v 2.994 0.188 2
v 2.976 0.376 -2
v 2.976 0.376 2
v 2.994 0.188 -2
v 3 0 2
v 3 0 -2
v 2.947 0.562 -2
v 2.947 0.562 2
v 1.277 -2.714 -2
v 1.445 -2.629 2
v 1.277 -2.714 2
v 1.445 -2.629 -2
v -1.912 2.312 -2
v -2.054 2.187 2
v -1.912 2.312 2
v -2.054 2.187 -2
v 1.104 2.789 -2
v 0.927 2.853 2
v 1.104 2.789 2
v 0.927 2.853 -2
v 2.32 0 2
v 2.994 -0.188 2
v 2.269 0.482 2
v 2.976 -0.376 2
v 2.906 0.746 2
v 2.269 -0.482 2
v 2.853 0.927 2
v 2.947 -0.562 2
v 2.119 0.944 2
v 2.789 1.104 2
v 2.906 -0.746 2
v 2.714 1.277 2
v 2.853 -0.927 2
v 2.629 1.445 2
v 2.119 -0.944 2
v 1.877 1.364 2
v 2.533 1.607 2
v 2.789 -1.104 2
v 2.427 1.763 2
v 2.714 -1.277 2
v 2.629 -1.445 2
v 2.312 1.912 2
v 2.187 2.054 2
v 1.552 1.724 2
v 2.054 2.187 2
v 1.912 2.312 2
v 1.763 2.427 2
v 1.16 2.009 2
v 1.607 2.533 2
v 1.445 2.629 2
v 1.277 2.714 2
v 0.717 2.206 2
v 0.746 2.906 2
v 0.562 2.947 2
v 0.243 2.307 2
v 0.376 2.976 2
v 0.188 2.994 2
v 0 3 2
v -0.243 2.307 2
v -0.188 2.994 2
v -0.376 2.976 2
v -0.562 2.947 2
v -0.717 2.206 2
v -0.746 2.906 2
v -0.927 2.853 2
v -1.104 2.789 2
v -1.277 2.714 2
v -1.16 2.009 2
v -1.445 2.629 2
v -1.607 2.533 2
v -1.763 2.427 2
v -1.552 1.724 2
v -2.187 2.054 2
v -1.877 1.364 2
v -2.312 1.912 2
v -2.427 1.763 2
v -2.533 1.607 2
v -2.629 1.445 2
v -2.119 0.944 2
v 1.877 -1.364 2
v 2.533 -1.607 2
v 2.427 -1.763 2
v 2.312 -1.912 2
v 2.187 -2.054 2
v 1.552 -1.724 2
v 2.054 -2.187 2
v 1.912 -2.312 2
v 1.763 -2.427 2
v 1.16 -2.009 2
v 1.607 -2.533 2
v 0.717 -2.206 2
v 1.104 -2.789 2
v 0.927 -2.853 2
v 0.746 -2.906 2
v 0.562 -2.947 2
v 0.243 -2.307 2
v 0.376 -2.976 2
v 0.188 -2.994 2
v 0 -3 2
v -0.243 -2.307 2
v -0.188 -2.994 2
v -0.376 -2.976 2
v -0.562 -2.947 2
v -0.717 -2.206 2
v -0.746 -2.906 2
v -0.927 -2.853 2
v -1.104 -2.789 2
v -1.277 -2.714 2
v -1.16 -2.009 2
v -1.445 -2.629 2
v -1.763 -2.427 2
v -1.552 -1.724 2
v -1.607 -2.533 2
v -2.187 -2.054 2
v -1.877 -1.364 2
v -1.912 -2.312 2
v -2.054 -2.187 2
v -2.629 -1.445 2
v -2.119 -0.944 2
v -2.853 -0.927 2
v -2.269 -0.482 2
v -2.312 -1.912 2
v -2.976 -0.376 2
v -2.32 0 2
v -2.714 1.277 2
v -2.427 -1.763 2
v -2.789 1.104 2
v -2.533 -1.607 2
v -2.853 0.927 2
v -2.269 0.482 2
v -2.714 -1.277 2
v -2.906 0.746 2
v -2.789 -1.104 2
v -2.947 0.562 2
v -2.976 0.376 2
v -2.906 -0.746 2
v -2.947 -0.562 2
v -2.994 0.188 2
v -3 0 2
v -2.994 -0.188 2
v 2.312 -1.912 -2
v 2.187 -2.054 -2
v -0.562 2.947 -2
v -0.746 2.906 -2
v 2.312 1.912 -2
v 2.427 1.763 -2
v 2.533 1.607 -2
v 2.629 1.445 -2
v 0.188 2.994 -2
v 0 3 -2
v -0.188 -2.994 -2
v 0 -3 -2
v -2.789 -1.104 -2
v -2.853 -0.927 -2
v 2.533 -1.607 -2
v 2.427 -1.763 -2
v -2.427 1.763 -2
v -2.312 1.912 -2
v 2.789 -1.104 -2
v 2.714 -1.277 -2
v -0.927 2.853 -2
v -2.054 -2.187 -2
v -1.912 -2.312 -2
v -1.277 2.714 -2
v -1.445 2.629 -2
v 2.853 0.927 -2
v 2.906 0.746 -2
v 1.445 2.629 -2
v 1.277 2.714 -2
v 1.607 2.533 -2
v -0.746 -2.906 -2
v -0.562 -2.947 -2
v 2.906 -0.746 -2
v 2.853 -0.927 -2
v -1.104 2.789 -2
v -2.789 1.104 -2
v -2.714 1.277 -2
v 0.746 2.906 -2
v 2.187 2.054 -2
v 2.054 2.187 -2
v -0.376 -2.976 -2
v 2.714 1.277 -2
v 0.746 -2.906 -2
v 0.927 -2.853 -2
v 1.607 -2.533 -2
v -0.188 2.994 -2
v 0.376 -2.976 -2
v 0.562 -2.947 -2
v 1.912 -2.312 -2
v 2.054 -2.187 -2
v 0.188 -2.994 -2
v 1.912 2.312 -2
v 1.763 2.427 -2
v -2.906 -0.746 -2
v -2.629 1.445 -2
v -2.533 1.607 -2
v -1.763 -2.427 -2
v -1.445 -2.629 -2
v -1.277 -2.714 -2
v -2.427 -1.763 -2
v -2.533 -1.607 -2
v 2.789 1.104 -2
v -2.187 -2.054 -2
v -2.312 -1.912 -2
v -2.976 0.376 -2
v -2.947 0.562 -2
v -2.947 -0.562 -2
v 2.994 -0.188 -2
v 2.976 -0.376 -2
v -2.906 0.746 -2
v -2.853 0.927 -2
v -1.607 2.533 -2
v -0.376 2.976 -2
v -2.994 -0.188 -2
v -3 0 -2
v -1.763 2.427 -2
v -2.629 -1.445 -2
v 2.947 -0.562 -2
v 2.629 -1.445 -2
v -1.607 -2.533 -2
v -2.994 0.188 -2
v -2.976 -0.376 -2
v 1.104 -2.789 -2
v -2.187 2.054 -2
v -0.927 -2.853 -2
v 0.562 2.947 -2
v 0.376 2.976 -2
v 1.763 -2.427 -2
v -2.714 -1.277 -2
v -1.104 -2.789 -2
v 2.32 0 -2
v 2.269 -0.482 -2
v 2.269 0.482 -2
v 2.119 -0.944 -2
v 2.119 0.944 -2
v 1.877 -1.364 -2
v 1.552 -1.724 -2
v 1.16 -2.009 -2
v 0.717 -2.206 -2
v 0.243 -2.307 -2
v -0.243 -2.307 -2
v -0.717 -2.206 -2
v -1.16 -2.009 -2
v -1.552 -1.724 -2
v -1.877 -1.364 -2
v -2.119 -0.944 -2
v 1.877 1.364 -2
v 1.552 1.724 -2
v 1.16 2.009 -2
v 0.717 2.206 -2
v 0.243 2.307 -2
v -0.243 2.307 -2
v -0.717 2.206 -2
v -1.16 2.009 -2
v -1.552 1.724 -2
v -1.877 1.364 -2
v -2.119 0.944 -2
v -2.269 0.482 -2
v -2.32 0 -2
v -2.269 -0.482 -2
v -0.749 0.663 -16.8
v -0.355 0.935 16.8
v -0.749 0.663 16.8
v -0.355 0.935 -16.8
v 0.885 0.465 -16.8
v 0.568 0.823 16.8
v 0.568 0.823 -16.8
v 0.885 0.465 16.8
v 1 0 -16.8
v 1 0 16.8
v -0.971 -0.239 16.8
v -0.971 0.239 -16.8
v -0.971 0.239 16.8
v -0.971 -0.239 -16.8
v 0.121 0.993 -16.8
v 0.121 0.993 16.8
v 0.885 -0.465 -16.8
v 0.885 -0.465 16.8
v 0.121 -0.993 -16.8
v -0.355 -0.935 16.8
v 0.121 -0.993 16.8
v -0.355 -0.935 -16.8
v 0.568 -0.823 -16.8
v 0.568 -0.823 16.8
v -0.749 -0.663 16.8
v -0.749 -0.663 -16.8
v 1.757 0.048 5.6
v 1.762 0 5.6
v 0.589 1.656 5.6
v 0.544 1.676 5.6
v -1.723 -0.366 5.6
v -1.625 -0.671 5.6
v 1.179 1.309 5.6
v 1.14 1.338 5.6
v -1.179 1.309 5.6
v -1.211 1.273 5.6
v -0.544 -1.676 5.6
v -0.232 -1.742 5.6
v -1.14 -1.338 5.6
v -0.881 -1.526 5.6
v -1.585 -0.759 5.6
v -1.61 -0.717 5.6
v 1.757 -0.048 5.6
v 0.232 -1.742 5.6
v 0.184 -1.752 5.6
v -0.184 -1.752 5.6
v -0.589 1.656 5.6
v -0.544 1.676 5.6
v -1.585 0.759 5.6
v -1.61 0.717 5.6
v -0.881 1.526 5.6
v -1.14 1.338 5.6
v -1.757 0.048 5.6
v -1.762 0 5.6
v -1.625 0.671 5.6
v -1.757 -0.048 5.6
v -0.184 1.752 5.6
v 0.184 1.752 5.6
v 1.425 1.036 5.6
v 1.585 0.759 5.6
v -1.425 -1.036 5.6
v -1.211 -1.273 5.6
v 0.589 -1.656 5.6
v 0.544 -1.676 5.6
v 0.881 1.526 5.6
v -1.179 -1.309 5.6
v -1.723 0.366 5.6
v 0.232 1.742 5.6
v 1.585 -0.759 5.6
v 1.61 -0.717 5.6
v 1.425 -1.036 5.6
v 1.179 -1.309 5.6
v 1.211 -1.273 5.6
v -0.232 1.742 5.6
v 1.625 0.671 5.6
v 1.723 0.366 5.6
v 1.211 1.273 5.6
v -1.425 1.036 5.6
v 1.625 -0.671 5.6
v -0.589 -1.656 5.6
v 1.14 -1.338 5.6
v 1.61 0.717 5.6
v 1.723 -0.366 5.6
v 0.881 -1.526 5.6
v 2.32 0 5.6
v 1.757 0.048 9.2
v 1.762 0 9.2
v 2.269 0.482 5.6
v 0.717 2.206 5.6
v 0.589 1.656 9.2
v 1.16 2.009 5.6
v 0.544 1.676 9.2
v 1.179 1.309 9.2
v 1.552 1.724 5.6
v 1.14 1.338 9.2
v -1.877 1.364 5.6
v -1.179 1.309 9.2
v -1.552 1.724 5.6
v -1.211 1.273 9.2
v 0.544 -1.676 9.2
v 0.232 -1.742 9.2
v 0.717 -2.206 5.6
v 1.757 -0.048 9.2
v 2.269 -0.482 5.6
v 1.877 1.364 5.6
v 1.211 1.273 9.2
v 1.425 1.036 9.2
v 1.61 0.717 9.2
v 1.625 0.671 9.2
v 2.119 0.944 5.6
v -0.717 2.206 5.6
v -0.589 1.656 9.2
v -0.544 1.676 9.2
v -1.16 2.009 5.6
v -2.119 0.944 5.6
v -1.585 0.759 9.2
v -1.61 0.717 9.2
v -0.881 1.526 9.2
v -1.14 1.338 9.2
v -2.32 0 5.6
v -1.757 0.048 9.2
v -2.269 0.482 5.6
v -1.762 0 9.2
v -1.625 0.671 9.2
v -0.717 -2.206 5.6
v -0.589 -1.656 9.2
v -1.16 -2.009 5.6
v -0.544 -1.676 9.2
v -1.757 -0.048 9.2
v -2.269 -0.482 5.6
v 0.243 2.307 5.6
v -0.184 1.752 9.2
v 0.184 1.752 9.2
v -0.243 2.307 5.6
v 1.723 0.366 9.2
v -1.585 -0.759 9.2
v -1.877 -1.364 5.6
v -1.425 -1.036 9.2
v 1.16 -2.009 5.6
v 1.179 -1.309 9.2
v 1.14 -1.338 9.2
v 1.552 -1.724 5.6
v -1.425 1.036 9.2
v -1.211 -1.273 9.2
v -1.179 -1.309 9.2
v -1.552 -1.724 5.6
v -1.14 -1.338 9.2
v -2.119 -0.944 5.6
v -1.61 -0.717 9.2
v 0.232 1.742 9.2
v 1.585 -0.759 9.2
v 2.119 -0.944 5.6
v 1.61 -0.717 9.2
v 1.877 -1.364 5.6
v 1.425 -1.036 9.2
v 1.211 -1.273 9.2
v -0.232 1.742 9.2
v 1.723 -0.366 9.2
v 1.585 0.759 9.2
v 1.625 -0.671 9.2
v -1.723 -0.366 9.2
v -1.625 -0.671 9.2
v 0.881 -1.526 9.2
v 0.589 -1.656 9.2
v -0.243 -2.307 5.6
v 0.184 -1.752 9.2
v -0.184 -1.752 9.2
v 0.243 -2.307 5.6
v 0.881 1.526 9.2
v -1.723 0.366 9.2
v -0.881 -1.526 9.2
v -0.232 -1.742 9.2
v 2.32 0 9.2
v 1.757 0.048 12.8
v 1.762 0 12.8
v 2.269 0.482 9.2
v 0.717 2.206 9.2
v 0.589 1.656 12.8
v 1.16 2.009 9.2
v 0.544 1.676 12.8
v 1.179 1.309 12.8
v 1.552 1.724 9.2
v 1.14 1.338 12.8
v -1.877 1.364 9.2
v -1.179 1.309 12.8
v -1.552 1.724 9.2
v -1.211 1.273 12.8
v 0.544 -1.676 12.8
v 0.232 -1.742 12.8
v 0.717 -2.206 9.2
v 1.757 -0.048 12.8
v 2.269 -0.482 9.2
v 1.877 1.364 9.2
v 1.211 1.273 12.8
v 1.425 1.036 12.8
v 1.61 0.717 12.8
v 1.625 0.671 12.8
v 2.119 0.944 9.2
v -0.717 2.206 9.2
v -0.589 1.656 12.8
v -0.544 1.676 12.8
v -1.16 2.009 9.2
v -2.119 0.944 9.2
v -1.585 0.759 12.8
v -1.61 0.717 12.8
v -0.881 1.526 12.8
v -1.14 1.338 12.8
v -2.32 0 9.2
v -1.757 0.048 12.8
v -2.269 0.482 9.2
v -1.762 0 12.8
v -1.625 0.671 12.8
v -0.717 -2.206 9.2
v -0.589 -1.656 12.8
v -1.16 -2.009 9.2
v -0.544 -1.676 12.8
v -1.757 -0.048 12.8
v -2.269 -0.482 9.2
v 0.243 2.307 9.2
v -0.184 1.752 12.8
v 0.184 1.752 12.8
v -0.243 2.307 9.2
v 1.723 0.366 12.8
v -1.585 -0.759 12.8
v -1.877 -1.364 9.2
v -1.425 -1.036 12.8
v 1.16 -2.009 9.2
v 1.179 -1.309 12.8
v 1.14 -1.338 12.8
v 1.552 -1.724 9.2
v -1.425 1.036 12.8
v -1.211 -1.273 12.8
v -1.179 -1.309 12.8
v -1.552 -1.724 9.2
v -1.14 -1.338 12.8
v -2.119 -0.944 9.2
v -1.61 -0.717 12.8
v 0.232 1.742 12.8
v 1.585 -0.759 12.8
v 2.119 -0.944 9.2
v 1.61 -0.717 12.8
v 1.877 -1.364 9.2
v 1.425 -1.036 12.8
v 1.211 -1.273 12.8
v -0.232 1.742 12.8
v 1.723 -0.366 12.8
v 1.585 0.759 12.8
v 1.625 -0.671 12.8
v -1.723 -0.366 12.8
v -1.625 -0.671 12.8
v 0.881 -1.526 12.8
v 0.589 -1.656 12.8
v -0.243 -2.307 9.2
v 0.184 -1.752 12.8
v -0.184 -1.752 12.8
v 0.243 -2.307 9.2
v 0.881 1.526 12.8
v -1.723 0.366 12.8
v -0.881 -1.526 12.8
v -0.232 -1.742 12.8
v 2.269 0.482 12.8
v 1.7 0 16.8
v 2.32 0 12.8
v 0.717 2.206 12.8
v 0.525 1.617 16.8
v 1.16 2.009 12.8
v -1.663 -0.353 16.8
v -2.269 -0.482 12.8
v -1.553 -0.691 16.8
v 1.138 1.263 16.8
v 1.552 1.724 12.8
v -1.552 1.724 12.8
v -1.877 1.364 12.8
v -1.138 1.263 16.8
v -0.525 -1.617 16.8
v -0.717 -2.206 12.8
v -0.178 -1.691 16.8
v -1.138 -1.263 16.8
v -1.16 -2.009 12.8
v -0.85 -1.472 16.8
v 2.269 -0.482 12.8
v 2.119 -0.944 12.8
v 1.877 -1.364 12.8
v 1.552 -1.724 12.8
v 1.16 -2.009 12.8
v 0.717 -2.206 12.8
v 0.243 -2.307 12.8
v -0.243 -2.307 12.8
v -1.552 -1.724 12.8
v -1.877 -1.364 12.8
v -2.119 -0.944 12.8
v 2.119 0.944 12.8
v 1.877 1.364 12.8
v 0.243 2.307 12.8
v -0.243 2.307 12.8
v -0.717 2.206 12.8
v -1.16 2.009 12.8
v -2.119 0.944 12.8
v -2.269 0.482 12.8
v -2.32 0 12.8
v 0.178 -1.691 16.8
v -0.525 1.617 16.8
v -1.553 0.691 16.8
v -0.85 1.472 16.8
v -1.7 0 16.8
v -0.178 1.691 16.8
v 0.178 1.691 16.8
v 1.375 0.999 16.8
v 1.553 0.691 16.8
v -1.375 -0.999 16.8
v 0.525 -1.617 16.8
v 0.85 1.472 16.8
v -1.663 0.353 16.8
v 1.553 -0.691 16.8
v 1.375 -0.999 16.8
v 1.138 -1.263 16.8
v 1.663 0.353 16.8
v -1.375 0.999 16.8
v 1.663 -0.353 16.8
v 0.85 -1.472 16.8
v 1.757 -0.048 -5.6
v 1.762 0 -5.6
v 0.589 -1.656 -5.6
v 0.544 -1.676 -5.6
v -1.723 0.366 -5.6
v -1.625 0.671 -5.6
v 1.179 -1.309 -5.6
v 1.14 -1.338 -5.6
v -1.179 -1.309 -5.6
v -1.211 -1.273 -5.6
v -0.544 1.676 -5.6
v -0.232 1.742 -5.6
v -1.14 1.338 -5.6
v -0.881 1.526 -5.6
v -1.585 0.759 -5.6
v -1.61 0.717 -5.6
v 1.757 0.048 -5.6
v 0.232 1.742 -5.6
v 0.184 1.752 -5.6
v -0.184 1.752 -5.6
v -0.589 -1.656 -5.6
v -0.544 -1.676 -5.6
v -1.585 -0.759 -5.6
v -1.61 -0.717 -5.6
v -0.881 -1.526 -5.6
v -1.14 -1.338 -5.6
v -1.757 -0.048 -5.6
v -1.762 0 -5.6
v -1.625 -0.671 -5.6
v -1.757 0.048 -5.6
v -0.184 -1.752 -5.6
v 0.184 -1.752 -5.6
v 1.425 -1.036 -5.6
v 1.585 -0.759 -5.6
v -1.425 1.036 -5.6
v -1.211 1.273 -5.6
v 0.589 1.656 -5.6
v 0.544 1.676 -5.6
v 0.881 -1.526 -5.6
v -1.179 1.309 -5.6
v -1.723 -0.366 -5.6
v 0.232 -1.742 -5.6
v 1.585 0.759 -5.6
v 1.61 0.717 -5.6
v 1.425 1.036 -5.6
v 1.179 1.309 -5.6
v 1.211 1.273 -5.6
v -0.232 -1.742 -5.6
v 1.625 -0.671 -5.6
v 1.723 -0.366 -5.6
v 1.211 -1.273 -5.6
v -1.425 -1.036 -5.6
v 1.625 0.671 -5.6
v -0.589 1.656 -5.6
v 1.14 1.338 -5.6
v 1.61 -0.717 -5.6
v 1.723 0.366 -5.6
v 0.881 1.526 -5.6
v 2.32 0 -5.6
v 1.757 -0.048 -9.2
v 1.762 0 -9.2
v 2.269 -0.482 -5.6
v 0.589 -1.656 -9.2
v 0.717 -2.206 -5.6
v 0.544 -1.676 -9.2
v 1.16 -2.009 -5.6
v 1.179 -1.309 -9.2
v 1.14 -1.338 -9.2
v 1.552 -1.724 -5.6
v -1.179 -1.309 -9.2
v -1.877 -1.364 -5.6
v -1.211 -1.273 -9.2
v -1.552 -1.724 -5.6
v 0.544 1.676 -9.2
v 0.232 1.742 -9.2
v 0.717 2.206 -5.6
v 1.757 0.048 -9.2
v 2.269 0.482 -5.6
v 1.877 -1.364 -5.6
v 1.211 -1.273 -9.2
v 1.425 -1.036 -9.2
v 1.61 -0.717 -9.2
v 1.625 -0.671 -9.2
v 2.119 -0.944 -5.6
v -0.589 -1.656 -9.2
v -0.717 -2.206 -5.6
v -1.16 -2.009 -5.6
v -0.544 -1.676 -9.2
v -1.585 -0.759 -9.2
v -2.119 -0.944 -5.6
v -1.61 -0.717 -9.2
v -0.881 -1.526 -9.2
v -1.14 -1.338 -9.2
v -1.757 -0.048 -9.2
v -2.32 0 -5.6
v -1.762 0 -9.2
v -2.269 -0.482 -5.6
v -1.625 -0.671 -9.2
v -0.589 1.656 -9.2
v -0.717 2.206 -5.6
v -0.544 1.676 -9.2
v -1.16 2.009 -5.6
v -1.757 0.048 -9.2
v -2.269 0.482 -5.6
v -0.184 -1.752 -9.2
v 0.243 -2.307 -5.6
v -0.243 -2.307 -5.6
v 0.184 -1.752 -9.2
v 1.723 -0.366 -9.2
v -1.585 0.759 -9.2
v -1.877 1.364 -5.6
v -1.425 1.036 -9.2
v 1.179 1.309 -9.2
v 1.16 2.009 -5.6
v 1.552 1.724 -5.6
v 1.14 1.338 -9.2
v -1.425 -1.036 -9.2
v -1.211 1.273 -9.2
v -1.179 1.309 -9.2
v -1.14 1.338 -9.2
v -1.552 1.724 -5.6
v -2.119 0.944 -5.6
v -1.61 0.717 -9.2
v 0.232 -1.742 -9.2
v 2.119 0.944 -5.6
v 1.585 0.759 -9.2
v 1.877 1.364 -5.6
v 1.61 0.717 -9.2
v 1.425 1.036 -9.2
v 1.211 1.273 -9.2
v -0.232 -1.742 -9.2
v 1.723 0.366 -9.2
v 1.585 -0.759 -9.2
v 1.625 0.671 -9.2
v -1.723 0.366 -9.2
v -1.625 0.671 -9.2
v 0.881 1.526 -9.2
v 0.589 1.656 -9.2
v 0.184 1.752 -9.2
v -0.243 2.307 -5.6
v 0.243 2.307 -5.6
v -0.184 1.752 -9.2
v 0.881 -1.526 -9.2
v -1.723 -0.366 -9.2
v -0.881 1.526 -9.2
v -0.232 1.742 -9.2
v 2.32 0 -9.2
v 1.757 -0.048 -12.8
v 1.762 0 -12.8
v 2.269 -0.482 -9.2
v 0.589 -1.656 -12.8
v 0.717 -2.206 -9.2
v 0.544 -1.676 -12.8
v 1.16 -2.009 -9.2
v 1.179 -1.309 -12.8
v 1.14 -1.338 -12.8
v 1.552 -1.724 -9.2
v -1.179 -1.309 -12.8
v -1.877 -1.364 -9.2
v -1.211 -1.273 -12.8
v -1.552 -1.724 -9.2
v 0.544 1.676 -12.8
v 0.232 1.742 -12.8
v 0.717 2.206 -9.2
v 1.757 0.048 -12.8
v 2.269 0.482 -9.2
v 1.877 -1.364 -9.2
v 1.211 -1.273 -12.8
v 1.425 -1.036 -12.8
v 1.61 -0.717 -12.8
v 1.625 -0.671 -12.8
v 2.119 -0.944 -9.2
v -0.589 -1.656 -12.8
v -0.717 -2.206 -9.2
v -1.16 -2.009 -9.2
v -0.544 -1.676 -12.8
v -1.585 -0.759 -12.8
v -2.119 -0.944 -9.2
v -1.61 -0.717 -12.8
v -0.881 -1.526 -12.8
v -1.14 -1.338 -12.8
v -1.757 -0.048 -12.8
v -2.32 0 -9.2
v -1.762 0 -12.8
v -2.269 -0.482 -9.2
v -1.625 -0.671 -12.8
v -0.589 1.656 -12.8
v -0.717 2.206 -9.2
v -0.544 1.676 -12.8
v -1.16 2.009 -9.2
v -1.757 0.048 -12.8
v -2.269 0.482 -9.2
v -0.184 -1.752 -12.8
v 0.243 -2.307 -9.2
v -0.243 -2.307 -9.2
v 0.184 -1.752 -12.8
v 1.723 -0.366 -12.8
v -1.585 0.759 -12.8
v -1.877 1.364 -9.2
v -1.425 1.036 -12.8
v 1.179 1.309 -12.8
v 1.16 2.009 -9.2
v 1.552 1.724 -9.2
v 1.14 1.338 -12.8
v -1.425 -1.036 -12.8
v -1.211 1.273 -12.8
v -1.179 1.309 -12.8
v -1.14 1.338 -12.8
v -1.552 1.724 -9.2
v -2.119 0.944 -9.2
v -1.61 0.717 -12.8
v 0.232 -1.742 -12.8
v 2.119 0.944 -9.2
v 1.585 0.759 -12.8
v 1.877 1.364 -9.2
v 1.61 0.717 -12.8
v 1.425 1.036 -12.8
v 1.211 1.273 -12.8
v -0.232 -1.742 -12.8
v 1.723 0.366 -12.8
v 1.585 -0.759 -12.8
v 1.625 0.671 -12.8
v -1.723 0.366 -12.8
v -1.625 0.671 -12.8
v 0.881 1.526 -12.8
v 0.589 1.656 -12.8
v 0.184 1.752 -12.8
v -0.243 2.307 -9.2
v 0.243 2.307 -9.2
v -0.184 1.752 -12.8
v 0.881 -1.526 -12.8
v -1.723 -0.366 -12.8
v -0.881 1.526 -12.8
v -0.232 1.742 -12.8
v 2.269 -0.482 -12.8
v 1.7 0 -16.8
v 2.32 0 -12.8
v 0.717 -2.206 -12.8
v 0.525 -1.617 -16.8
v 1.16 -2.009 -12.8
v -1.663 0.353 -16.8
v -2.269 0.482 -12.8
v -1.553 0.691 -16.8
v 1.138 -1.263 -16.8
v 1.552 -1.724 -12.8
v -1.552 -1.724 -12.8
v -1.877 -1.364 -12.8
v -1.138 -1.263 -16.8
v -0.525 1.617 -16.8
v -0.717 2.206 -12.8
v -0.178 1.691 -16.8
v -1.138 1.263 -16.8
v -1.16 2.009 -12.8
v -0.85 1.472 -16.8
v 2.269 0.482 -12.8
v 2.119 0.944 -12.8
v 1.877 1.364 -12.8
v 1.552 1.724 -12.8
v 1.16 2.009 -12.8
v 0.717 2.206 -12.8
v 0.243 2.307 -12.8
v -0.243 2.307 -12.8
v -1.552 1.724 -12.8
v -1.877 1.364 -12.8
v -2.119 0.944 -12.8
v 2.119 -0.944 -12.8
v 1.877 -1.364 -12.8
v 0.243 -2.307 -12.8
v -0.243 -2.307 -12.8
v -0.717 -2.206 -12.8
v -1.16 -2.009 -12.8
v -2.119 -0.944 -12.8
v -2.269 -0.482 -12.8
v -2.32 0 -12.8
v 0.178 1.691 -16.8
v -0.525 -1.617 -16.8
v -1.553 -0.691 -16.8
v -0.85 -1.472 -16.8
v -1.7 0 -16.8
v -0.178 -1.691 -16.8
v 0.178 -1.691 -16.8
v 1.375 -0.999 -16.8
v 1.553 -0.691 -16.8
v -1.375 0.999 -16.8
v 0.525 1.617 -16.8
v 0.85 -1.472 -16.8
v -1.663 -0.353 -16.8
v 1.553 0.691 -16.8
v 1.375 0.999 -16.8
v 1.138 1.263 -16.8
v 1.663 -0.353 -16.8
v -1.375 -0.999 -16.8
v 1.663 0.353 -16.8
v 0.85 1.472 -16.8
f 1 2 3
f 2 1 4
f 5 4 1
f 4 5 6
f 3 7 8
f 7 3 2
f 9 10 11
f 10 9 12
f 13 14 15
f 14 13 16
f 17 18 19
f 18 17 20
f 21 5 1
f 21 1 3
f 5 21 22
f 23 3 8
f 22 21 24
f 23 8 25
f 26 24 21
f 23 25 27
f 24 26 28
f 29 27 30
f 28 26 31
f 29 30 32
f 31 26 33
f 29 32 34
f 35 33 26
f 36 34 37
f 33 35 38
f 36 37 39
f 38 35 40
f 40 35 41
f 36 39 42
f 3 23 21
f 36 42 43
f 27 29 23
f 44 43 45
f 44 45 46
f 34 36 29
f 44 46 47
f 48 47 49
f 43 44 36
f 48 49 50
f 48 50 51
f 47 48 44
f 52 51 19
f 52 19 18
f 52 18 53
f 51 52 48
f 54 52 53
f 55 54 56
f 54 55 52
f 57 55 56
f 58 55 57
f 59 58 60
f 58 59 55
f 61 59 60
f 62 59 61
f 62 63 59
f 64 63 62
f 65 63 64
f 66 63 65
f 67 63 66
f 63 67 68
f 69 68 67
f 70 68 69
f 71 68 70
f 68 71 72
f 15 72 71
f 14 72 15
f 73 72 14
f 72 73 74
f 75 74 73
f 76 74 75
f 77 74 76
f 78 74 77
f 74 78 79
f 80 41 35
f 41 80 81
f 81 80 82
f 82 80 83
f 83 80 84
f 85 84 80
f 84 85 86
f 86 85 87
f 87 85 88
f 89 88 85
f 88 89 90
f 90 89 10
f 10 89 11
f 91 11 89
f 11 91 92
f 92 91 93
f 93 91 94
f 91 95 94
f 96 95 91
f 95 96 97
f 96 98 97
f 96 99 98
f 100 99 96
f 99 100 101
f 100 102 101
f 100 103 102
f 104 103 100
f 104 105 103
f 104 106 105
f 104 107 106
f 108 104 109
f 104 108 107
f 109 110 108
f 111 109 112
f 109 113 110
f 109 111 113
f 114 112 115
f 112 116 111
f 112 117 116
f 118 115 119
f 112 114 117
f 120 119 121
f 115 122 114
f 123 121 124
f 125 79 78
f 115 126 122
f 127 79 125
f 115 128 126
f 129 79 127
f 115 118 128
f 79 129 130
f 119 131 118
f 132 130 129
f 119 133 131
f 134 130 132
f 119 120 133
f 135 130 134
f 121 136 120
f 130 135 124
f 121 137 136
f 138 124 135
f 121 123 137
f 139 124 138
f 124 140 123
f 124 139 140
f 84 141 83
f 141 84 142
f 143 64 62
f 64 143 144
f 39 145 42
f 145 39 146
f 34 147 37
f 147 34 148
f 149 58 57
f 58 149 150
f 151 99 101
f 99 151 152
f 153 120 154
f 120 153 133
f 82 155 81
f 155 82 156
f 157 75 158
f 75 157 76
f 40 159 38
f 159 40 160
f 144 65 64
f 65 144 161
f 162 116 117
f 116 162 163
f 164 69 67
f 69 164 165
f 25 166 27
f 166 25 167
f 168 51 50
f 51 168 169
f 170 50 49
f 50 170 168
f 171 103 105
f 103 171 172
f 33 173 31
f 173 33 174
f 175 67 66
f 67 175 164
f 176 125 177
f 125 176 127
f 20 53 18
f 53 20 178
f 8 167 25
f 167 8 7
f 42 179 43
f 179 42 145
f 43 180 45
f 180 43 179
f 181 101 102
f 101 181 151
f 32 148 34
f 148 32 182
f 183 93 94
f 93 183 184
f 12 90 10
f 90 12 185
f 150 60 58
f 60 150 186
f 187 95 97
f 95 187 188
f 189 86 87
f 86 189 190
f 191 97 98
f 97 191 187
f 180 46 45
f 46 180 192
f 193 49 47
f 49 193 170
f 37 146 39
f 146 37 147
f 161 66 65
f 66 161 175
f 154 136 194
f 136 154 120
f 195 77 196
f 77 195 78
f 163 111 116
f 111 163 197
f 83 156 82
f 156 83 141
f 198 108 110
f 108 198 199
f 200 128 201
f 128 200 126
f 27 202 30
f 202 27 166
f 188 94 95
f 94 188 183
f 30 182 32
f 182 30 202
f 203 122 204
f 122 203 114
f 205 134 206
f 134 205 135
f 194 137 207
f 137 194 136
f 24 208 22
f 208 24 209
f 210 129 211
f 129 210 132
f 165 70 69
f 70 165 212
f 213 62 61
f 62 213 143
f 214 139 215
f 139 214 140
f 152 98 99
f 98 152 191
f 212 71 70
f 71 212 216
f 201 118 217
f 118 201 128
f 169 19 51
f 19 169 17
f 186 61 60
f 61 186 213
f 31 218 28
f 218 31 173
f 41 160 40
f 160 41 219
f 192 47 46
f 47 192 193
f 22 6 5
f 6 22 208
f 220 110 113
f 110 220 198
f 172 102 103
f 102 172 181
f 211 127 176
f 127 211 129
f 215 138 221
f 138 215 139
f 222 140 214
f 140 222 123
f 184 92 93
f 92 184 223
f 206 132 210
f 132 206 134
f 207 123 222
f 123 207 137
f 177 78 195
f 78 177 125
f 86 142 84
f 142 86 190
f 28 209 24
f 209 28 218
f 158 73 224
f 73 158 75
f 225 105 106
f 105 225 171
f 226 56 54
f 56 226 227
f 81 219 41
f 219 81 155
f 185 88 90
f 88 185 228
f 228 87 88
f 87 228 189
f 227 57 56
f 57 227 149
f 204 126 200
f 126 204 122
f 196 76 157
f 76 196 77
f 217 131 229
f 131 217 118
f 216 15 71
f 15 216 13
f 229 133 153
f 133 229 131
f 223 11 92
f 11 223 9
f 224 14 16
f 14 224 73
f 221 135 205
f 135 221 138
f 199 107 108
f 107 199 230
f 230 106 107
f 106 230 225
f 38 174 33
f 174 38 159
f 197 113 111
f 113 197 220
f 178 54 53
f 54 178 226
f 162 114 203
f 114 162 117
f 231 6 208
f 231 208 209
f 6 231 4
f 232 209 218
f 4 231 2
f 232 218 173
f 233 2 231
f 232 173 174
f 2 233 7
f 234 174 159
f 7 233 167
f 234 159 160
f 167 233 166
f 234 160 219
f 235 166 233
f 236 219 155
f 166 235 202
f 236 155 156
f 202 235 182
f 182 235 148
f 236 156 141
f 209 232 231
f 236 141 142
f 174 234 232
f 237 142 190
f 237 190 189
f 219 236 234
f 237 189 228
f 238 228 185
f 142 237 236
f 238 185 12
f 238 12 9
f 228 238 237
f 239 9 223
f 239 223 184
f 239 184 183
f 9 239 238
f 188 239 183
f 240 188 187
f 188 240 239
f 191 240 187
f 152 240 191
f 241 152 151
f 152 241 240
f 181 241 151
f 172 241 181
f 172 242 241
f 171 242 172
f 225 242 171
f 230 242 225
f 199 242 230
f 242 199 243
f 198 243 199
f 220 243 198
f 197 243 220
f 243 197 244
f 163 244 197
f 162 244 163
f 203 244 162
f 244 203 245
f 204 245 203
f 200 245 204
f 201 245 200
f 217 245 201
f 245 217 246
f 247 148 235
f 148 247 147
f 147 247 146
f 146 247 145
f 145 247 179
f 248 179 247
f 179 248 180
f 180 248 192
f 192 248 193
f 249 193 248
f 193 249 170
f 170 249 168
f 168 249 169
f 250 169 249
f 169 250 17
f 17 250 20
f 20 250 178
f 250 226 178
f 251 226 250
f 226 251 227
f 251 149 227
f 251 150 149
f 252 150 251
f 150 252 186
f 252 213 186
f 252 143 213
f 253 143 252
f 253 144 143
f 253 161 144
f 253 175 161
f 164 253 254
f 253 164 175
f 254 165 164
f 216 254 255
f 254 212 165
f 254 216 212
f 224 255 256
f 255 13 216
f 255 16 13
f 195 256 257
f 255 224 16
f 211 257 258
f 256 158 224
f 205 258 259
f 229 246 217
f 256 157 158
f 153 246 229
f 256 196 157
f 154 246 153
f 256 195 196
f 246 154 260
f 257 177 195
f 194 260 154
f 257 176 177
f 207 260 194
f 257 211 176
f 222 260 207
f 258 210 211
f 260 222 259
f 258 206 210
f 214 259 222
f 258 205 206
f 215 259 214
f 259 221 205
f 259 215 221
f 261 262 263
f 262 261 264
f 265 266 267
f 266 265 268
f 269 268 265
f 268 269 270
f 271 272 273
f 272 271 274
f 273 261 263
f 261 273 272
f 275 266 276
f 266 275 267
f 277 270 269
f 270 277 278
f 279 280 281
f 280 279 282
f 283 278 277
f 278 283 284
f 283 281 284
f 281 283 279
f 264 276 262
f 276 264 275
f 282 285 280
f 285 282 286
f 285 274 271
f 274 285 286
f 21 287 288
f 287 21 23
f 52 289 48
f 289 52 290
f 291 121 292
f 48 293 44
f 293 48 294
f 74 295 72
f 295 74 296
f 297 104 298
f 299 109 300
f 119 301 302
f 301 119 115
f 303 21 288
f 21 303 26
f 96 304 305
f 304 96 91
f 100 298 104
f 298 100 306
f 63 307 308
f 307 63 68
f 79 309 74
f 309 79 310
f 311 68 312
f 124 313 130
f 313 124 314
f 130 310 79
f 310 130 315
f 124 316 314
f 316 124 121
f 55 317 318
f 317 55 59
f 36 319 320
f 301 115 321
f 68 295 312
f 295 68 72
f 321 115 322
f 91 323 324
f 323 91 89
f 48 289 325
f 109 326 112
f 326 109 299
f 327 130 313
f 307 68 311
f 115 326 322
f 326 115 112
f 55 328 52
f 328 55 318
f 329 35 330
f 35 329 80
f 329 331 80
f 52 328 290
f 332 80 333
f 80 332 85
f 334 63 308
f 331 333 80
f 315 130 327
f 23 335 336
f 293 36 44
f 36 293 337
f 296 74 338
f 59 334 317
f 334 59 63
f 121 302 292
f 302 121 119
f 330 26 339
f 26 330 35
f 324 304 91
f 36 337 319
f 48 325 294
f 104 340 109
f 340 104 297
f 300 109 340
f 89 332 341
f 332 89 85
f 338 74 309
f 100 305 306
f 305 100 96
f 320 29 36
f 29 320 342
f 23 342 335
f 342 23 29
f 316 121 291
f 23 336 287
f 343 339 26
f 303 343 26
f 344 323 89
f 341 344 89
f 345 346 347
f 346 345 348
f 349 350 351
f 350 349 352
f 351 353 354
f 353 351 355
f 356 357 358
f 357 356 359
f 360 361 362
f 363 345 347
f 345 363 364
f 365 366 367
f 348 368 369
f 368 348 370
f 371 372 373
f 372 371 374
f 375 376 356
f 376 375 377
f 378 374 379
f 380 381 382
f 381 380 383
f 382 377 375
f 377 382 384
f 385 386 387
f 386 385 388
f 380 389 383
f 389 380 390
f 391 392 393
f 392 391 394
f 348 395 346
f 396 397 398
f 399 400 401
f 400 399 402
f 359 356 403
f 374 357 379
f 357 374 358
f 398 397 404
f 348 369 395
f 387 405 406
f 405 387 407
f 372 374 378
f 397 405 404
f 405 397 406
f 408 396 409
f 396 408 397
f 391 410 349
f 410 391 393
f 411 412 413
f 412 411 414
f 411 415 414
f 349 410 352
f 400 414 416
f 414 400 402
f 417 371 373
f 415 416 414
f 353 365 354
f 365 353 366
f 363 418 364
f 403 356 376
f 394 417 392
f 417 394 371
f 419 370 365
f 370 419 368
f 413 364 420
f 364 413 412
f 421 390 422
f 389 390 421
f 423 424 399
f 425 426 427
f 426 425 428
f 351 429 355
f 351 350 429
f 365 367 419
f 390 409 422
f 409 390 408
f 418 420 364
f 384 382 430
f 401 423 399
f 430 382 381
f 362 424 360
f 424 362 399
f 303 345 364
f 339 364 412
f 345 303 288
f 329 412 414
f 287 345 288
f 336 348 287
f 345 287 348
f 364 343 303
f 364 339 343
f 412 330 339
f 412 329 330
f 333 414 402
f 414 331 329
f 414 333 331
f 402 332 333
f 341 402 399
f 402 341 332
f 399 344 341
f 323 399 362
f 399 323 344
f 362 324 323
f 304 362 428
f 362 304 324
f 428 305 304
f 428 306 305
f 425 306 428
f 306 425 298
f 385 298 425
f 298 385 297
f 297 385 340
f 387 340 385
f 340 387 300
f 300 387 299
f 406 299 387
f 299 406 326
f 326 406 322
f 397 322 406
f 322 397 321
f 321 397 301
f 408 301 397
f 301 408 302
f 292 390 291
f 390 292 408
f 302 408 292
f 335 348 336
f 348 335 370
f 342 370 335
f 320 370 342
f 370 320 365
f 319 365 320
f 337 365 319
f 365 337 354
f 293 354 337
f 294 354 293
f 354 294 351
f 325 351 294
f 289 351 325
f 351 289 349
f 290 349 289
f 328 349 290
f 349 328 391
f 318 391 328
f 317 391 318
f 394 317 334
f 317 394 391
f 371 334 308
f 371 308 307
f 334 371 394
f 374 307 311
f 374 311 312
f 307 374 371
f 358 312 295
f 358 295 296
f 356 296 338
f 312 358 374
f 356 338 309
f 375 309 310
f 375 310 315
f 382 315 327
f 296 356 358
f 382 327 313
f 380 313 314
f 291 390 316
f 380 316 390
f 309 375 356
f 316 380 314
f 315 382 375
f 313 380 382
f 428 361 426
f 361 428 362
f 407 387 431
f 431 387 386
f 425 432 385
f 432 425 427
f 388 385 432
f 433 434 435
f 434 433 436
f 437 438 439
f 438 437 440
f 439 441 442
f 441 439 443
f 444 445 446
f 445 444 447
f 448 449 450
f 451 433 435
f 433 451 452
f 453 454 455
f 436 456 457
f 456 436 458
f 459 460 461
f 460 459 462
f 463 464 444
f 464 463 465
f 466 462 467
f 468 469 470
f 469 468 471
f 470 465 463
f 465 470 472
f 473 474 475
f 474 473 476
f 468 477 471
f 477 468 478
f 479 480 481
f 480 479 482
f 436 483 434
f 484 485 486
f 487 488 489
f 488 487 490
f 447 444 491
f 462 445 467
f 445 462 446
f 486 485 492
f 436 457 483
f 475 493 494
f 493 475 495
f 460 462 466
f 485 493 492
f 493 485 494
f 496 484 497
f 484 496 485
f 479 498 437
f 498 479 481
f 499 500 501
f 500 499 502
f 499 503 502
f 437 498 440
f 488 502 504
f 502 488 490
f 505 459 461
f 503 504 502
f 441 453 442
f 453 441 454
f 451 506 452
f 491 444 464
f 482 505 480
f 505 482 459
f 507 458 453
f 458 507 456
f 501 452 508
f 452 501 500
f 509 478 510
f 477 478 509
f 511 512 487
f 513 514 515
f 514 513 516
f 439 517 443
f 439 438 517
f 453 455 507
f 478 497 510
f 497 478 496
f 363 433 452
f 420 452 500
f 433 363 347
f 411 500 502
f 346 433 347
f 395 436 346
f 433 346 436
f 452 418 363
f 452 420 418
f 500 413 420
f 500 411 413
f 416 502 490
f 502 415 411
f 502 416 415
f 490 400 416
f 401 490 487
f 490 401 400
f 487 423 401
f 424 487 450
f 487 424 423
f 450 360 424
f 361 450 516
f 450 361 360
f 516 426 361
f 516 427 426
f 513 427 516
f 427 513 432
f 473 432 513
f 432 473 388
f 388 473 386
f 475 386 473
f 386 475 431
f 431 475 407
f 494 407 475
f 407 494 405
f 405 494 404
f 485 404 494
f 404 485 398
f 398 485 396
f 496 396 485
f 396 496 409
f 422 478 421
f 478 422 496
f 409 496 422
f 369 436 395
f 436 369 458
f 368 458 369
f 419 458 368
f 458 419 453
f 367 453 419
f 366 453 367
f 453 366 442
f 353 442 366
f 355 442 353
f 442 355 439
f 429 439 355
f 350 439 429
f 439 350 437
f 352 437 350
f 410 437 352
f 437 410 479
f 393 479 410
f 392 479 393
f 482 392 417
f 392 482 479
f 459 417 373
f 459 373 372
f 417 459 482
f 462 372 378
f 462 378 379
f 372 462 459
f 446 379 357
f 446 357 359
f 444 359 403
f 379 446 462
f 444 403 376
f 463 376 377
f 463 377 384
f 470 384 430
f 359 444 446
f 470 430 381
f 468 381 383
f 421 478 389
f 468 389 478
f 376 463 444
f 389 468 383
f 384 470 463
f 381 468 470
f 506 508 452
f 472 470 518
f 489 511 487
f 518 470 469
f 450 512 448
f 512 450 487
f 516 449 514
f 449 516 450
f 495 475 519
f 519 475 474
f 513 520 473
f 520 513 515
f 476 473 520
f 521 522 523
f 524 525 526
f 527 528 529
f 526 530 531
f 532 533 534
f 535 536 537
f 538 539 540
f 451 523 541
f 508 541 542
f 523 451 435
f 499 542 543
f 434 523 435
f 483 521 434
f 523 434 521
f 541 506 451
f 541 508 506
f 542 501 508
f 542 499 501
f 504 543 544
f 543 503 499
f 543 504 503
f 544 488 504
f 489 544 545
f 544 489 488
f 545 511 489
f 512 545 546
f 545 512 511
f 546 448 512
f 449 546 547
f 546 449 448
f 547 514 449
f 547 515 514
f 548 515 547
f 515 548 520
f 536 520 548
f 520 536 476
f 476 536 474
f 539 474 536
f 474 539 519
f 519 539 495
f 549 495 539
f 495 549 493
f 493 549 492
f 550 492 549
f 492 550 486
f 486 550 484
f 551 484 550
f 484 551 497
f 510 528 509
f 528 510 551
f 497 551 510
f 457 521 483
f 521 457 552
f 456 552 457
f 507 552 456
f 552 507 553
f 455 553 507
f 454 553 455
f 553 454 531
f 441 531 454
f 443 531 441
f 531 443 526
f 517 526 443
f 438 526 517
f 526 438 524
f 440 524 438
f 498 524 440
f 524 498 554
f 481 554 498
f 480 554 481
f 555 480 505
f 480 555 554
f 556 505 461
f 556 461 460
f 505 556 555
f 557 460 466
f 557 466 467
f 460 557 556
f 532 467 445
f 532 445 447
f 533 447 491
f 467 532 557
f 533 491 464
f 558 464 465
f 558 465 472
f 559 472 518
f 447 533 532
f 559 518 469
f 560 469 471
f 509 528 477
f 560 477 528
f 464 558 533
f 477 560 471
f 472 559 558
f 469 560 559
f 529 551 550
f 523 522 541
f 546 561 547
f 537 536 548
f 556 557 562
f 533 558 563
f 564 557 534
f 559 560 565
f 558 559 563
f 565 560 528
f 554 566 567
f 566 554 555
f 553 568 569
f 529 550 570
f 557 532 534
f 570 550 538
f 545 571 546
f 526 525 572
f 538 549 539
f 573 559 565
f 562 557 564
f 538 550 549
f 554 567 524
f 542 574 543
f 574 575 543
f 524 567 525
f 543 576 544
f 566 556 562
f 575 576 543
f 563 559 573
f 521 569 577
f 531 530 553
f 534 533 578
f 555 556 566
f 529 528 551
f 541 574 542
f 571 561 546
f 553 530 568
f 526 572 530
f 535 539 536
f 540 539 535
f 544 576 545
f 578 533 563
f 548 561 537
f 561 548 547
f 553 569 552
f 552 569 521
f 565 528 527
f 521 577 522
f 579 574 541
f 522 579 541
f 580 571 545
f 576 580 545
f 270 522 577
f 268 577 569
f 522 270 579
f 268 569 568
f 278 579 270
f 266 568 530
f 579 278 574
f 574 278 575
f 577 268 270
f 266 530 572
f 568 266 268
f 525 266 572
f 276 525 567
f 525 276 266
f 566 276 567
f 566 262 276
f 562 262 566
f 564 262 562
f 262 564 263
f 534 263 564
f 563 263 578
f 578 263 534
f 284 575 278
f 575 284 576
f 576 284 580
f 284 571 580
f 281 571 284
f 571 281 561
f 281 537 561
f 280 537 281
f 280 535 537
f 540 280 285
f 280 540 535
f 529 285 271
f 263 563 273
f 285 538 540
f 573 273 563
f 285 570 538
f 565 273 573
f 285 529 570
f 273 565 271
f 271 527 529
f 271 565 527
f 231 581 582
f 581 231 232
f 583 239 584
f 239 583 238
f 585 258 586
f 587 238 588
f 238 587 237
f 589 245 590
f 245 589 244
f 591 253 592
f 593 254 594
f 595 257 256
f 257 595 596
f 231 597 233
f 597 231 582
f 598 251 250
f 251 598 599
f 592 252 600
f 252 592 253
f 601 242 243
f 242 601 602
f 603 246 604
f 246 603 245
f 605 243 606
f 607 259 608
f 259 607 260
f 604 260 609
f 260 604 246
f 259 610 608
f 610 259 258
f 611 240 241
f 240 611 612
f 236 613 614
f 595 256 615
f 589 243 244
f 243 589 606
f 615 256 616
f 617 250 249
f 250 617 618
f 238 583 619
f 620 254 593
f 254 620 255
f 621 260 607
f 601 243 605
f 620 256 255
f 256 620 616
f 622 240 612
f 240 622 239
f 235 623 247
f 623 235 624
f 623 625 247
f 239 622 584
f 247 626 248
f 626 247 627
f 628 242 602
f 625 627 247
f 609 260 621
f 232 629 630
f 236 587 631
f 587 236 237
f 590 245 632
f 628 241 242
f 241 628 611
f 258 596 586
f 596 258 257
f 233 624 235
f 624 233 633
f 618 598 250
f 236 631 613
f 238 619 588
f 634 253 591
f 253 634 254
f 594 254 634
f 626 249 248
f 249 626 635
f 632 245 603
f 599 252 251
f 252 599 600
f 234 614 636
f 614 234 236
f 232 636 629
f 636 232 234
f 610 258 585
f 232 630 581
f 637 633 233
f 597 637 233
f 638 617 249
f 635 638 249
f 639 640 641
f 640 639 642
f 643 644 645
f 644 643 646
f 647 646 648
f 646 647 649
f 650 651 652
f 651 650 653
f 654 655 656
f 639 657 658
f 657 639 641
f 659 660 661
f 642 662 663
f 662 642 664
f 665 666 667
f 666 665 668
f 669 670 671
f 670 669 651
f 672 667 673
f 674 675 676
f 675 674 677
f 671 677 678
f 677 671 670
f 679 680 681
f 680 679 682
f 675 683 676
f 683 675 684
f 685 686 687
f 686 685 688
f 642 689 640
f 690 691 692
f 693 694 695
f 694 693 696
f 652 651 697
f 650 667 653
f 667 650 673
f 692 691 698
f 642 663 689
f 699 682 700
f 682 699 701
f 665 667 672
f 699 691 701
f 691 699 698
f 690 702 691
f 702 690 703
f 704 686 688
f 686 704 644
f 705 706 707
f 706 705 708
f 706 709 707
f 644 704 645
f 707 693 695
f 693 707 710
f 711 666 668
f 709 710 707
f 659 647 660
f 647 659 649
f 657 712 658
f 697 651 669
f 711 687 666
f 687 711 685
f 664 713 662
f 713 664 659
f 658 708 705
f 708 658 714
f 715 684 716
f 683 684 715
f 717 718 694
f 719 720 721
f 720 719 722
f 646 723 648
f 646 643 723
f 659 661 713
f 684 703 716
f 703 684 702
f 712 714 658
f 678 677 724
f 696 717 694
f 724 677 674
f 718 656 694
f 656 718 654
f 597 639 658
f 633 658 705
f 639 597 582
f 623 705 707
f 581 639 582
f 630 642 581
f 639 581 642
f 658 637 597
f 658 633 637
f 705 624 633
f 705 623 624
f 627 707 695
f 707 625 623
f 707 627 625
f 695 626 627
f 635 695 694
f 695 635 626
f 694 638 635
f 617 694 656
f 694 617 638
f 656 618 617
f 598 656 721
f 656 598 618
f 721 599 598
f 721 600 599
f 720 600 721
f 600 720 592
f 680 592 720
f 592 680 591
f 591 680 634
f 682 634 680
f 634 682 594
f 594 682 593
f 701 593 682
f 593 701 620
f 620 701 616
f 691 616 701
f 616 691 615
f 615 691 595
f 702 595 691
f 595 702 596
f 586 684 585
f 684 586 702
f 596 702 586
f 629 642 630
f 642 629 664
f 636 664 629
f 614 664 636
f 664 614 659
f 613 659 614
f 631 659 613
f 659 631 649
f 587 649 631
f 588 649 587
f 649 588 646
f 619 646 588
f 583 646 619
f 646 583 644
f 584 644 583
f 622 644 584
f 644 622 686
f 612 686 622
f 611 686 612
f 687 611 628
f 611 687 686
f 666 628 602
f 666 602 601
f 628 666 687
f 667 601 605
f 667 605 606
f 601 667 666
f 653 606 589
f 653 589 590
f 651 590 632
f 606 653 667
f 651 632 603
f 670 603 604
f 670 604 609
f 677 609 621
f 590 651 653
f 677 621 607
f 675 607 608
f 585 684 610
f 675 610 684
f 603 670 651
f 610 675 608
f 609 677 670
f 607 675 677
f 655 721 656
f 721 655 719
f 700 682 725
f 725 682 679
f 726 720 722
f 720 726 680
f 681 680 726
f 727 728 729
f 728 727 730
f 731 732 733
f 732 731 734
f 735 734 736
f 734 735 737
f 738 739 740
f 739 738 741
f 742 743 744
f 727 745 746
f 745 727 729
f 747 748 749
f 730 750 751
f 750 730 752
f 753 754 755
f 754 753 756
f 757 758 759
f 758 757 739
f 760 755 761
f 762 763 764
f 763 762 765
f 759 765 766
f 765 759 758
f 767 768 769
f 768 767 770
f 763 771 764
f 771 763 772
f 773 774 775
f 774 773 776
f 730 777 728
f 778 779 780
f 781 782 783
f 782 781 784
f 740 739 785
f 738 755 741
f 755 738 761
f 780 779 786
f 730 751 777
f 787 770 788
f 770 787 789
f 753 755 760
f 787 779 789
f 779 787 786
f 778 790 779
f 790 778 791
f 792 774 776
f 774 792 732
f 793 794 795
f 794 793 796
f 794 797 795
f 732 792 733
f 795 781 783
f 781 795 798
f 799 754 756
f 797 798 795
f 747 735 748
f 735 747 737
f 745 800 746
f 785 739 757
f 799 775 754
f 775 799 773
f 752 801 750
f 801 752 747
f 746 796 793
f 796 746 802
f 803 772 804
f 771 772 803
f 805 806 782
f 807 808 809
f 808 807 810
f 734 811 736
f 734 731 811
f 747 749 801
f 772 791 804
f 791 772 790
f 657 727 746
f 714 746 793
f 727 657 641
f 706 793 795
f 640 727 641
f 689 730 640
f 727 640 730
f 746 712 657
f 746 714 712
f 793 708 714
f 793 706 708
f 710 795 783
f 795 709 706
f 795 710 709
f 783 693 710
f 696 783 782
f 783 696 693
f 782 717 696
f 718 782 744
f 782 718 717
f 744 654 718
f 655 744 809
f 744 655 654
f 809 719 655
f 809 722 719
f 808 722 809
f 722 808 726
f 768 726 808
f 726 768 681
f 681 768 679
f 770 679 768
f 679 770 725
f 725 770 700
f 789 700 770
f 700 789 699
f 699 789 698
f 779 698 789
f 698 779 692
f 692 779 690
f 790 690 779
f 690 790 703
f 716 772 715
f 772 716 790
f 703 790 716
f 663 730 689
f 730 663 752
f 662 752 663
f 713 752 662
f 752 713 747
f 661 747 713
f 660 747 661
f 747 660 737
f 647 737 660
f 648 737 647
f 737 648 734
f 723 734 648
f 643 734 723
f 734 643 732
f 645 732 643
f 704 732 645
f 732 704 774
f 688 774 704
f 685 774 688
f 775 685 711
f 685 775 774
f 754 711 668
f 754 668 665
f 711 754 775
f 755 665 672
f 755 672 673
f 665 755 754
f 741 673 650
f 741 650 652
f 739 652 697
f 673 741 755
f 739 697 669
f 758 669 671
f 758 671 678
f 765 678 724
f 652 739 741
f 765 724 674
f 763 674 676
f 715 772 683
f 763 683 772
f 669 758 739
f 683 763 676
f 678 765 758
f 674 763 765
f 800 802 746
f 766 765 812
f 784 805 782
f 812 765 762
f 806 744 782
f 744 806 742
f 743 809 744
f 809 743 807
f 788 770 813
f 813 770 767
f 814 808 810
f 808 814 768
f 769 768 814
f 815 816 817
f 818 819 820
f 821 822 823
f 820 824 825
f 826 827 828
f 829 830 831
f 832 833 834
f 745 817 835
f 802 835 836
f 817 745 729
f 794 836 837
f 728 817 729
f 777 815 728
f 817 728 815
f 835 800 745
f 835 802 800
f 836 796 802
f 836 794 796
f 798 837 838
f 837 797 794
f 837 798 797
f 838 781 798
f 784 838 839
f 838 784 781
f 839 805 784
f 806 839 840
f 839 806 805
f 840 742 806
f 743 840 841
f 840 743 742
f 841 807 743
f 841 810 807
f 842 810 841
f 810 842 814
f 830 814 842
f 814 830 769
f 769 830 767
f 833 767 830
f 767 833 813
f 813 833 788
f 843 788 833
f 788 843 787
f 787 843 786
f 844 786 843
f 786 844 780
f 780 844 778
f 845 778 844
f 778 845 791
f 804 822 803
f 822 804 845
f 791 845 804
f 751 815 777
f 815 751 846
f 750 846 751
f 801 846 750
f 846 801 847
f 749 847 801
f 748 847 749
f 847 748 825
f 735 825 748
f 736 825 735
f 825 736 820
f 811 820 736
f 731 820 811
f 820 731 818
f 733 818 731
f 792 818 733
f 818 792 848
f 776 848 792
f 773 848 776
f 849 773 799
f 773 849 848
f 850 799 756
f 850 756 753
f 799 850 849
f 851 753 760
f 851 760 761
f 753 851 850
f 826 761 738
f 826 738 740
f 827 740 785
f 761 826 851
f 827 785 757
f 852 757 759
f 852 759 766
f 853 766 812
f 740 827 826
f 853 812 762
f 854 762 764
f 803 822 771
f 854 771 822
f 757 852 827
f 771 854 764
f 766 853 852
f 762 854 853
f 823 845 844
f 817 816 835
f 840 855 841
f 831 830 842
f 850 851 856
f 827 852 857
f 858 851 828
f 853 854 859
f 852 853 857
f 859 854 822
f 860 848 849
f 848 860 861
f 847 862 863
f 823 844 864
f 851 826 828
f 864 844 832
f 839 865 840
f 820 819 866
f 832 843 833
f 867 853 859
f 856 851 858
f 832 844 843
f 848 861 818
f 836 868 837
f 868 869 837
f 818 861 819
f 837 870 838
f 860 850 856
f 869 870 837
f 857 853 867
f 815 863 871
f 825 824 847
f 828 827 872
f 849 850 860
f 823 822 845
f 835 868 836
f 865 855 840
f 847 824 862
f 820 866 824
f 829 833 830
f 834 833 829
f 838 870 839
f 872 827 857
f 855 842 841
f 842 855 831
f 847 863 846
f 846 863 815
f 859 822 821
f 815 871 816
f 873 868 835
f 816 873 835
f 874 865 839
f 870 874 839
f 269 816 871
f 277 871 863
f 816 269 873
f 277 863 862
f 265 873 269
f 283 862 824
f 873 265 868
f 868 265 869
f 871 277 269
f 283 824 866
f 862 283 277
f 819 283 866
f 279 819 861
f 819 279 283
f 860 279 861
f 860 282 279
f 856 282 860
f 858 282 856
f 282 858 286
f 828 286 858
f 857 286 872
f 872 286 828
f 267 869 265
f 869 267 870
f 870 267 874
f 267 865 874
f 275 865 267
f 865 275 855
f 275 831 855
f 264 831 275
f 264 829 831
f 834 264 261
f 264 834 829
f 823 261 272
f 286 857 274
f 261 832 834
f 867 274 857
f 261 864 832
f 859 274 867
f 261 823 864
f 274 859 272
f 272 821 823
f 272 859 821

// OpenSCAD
/*
Adapted from: Hose barb adapter and manifold by papergeek  www.thingiverse.com/thing:158717


This version gives you a few different options you can change the shape of the middle section on a two way connector so that it is round or hex shaped. the option to add multiple connections in two different sizes.

update 5/3/2016

Added the option to create a "L" shaped two way connection.

*/
// Number of tubes size A's to connect. 
Number_of_Size_A = 2;
// Number of tubes size B's to connect. Size A should be the smaller hose
Number_of_Size_B = 0;

// Hose A inside diameter or bore
Size_A = 4; 
// Hose B inside diameter or bore
Size_B = 8; 

// Manifold Bore = Size - Wall Thickness thicker walls are stronger but have a smaller bore. 
// Wall_Thickness_n must be less than Size_n

// Wall_Thickness_A must be less than Size_A
Wall_Thickness_A = 1;
// Wall_Thickness_B must be less than Size_B
Wall_Thickness_B = 1;

// on 3 and 4 port connectors you can choose if the manifold is square "T" or polygon "Y" OR "L" for a two port connector at right angles
junction_type = "T"; // [Y, T, L]

// Number of barbs on output - try 3 for larger tubing to reduce overall print height try 4 for smaller tubing
Size_A_barb_count = 4;
Size_B_barb_count = 3;

// For 2 port(inline) connectors the shoulder can be hexagional to fit a spanner or round
Inline_Connector = "round"; // [round, hex]
// Size across the flats of the Hex
Hex_Size = 8; 
// How much shoulder overhanging the largest port on round inline connectors.
Shoulder = 1;


// Hidden Variables used throught the sketch dont't sugest changing these
Size_A_Bore = Size_A - (Wall_Thickness_A * 2);
Size_B_Bore = Size_B - (Wall_Thickness_B * 2);
//change manifold to hex shaped
Edges = Inline_Connector == "hex" ? 6 : 100 ; 

Number_of_Faces = Number_of_Size_A + Number_of_Size_B;


// create inline connector
if (Number_of_Faces == 2 && junction_type !="L")
{
  Size = Number_of_Size_A == 2 ? Size_A : Size_B ;
  HYP = (Hex_Size / 2) / cos(30);
  Size_1 = Inline_Connector == "hex" ? (HYP * 2) : (Size + 2*Shoulder) ; // size of manifols 
  Bore_1 = Number_of_Size_A > 1 ? Size_A_Bore : Size_B_Bore ; 
  Bore_2 = Number_of_Size_A > 0 ? Size_A_Bore : Size_B_Bore ;

  union()
  {
    difference()
    {
      cylinder( h = Size , d = Size_1, center = true, $fa = 0.5, $fs = 0.5, $fn = Edges )  ;
      cylinder(h = Size + 1, d1 = Bore_1, d2 = Bore_2, center = true, $fa = 0.5, $fs = 0.5 );
    }

// Top port
    translate([0, 0, Size / 2])
    {
      if (Number_of_Size_A > 0)
      {
        connector_size_A();
      }
      else
      {
        connector_size_B();
      }
    }
// Bottom port
    translate([0, 0, -Size / 2])rotate([180, 0, 0])
    {
      if (Number_of_Size_A == 2)
      {
        connector_size_A();
      }
      else
      {
        connector_size_B();
      }
    }
  }
}

// Multi port manifold

if (Number_of_Faces > 2 || junction_type == "L")
{
  Port_Height = Number_of_Size_B > 0 ? Size_B : Size_A ;
  Port_Bore = Number_of_Size_B > 0 ? Size_B_Bore : Size_A_Bore;
  Face_Height = Port_Height * 1.5;

  junction = Number_of_Faces > 4 ? "Y" : junction_type  ;
  Smooth = Inline_Connector == "round" ? Number_of_Faces + 100 : Number_of_Faces;

  angleA = (360 / (Number_of_Size_A + Number_of_Size_B));
  angleB = 90;
  angle = junction == "Y" ? angleA : angleB ;

      /*  To calculate the Apothem (or radius of a polygon's inner circle)
        Apothem = R * Cos *(180/N)

          where:
          R = radius of polygons outer circle or circumcircle
          N = number of sides/faces
    */
  Radius = (Port_Height* 1.16 ) / (2 * sin(180 / Number_of_Faces));
  Apothem  = junction == "L" ? Port_Height* 1.16 : (Radius + 4) * cos(180 / Number_of_Faces) ;
//  Apothem = (Radius + 4) * cos(180 / Number_of_Faces);



// create body of manifold  
  union()
  {
    difference()
    {
      if ( junction == "Y")
      {
        rotate([0, 0, angle / 2])cylinder( h = Face_Height , r = Radius + 4, center = true, $fa = 0.5, $fs = 0.5, $fn = Smooth )  ;
      }
      if (junction == "T")
      {
        cube( Apothem *2 , center = true, $fa = 0.5, $fs = 0.5);
      }
      if ( junction == "L")
      {
        cube( Apothem * 2 , center = true, $fa = 0.5, $fs = 0.5);
      }
      
      cylinder( h = Port_Bore , d = Port_Height, center = true, $fa = 0.5, $fs = 0.5, $fn = Number_of_Faces )  ;

// bore holes for the ports
      if (Number_of_Size_A > 0)
      {
        for (n = [1:Number_of_Size_A ])
        {
          rotate([angle * n, 90, 0]) cylinder( h = Apothem *2 , d = Size_A_Bore, center = false, $fa = 0.5, $fs = 0.5);
        }
      }
      if (Number_of_Size_B > 0)
      {
        for (n = [1:Number_of_Size_B  ])
        {
          rotate([(angle * n) + (angle * Number_of_Size_A), 90, 0]) cylinder( h = Apothem *2 , d = Size_B_Bore, center = false, $fa = 0.5, $fs = 0.5);
        }
      }


    }
// Add the ports
    
    if (Number_of_Size_A > 0)
    {
      for (i = [1:Number_of_Size_A ])
      {
        rotate([angle * i, 90, 0])translate([0, 0, Apothem - 0.5])  connector_size_A();
      }
    }
    if (Number_of_Size_B > 0)
    {
      for (i = [1:Number_of_Size_B ])
      {
        rotate([(angle * i) + (angle * Number_of_Size_A), 90, 0])translate([0, 0, Apothem - 0.5])  connector_size_B();
      }
    }
  }
}



module connector_size_A()
{
  difference()
  {
    union()
    {
      for ( i = [1:Size_A_barb_count])
      {
        translate([0, 0, (i - 1) * Size_A * 0.9]) cylinder( h = Size_A , r2 = Size_A * 0.85 / 2, r1 = Size_A * 1.16 / 2, $fa = 0.5, $fs = 0.5 );

      }
    }
    translate([0, 0, -0.1]) cylinder( h = Size_A * Size_A_barb_count , d = Size_A_Bore , $fa = 0.5, $fs = 0.5 );
  }
}
module connector_size_B()
{
  difference()
  {
    union()
    {
      for ( i = [1:Size_B_barb_count])
      {
        translate([0, 0, (i - 1) * Size_B * 0.9]) cylinder( h = Size_B , r2 = Size_B * 0.85 / 2, r1 = Size_B * 1.16 / 2, $fa = 0.5, $fs = 0.5 );

      }
    }
    translate([0, 0, -0.1]) cylinder( h = Size_B * Size_B_barb_count , d = Size_B_Bore , $fa = 0.5, $fs = 0.5 );
  }
}
